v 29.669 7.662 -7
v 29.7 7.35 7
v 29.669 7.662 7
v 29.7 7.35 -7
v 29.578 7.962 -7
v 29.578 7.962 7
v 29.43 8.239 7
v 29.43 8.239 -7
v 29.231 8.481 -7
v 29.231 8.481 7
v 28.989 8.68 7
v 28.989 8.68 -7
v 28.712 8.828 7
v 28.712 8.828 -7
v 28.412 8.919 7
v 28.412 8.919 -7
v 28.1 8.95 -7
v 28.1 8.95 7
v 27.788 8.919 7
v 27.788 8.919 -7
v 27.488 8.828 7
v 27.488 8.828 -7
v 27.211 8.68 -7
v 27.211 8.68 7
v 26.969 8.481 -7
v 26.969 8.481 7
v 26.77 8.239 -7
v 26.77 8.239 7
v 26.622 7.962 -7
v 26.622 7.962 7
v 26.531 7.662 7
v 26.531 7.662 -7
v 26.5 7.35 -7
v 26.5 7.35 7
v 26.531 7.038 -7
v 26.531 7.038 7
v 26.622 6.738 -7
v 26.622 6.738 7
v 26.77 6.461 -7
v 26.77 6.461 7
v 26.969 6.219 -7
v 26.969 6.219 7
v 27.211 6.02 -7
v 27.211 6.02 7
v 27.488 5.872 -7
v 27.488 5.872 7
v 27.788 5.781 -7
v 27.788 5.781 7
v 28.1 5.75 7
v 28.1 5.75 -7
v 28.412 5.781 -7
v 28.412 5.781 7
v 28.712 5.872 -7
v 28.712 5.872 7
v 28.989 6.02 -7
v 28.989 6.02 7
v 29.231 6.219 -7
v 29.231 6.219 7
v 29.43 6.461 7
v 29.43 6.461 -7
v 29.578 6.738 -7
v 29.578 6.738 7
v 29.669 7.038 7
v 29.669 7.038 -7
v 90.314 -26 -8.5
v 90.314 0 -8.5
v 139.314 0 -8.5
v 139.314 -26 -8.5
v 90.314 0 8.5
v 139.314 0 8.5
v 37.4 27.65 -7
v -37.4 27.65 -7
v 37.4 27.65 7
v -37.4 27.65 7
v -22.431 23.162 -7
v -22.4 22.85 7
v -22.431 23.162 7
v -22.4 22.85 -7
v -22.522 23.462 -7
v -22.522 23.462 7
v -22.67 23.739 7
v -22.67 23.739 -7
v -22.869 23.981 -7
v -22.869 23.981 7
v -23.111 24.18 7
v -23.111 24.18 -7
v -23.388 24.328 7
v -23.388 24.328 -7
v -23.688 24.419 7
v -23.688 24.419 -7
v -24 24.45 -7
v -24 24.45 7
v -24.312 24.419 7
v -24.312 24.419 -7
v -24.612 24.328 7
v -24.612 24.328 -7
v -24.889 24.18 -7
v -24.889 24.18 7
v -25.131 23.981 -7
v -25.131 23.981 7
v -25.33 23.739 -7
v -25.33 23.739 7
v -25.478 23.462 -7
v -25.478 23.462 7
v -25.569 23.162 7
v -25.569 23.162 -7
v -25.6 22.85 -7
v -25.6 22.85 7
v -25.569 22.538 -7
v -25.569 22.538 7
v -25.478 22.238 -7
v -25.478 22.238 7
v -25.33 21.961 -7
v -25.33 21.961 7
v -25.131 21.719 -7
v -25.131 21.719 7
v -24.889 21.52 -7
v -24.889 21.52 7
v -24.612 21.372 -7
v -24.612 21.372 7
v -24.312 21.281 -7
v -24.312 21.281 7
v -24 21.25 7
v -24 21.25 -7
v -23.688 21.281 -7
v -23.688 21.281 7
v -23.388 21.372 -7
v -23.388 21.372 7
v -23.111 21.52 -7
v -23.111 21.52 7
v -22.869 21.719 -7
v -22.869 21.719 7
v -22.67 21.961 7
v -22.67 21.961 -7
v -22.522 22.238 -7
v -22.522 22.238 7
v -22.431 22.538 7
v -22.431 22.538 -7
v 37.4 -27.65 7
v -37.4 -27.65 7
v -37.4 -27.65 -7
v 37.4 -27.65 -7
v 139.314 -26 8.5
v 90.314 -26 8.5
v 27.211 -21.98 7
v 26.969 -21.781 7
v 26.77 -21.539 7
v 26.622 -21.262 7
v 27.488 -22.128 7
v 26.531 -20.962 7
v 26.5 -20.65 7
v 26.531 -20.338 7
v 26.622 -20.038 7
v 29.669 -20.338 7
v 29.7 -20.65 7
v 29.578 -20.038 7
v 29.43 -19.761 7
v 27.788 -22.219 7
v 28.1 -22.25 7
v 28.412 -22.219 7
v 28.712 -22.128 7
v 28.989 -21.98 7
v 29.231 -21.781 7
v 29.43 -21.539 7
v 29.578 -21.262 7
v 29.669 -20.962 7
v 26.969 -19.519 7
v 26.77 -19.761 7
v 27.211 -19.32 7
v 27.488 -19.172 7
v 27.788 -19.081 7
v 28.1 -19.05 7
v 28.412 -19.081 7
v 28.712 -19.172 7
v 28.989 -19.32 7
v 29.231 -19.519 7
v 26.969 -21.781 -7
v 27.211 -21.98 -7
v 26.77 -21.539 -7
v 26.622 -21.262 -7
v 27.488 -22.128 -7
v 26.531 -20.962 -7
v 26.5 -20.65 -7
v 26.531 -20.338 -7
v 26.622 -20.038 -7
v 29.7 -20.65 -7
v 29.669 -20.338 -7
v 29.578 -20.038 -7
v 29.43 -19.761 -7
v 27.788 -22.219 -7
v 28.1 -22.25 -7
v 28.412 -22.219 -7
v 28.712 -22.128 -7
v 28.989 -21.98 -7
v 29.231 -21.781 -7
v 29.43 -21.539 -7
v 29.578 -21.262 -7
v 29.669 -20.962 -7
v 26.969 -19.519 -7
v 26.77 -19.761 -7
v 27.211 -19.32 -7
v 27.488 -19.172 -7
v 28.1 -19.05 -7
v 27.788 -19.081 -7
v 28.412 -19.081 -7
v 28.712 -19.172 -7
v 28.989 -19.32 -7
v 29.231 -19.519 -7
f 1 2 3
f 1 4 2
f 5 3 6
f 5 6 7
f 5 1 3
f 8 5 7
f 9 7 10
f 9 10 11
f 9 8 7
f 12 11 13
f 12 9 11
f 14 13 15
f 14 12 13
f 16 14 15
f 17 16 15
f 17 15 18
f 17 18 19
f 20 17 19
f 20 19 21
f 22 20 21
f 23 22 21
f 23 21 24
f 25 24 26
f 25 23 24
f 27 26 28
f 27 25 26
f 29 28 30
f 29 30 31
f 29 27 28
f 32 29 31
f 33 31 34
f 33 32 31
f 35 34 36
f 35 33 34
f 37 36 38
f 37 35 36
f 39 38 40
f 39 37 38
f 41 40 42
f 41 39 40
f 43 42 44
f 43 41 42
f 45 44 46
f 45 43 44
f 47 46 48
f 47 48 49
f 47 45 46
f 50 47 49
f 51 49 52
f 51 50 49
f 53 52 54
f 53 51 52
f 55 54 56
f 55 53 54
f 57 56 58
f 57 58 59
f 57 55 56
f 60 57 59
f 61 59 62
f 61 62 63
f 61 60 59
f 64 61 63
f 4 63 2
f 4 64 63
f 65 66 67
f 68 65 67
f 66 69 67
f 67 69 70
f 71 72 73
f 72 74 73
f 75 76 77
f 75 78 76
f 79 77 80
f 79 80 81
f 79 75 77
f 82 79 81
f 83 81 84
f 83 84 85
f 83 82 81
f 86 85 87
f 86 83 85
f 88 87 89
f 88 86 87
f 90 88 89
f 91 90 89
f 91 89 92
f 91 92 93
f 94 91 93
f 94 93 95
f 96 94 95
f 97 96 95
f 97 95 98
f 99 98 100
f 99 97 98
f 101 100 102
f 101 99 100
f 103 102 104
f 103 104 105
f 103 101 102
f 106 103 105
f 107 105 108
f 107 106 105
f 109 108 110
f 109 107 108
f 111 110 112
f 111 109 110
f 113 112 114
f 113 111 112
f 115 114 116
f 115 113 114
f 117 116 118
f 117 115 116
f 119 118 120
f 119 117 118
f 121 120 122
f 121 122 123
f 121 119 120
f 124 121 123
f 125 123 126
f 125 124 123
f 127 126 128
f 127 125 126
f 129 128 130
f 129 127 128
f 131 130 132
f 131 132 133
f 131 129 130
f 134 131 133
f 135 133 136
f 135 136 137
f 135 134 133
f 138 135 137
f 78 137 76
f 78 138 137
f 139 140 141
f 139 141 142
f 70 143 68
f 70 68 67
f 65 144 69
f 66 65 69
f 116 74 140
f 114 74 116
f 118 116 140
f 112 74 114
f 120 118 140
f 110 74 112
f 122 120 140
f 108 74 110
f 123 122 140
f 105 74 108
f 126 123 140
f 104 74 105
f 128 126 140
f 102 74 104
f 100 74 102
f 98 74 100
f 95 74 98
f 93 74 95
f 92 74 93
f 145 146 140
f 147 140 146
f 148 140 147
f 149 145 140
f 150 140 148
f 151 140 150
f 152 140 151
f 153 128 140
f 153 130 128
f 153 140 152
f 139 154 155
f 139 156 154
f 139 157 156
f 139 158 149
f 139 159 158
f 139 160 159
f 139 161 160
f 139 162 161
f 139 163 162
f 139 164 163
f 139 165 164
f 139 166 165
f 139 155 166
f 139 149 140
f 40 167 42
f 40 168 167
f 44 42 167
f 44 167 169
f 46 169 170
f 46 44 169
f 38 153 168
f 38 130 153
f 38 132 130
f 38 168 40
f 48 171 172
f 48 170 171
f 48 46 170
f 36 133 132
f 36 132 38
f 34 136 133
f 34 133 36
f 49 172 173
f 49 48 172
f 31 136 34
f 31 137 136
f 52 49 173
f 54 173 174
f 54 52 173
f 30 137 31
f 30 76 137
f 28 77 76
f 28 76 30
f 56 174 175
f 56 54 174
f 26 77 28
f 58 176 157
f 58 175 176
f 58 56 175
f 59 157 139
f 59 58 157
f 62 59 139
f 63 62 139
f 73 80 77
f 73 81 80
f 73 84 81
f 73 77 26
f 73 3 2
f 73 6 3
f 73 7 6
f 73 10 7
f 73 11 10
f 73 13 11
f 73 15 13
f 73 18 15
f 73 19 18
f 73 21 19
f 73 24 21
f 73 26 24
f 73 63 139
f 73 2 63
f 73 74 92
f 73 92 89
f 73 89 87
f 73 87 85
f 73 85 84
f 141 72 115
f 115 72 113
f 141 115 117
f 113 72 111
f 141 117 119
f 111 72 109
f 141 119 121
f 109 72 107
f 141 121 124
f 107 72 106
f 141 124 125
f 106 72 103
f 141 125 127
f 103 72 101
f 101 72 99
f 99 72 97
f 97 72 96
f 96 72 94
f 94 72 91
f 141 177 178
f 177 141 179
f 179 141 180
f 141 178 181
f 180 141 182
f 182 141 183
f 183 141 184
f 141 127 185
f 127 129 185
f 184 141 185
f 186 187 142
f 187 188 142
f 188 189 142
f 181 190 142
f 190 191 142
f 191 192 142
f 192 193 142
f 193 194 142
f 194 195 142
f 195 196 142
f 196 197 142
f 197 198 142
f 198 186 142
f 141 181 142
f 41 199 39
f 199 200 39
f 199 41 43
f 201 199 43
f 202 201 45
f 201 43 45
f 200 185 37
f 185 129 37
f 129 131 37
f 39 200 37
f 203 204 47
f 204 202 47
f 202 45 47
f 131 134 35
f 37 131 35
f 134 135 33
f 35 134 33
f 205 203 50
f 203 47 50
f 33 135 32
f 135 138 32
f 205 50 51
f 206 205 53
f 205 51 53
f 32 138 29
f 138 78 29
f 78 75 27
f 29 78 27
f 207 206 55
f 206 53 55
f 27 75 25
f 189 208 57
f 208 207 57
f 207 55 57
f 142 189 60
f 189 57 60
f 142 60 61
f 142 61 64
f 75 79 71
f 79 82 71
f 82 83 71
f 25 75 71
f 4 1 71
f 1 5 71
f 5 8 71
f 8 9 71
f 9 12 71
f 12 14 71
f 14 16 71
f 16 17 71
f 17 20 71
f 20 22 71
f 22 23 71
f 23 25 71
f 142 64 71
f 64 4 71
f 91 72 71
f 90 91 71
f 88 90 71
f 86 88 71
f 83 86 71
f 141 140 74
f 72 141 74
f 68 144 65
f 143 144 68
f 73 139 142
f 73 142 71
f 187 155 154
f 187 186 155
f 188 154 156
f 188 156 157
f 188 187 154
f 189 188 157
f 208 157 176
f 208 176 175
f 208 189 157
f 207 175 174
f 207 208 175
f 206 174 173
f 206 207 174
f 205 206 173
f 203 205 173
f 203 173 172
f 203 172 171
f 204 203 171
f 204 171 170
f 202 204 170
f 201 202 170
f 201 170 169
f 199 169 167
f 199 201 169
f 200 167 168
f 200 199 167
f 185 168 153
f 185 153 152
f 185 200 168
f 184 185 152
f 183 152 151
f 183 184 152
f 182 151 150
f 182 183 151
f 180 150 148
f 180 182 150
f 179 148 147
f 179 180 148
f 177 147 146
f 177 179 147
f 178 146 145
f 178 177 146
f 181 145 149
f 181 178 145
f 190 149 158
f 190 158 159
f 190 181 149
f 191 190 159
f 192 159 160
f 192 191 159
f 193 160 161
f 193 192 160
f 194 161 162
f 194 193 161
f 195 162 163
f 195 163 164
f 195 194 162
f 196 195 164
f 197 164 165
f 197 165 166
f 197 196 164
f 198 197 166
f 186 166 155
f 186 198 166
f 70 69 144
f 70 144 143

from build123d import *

# Parameters (mm, degrees)
F0_W     = 74.8
F0_H     = 55.3
F0_R     = 1.6
F1_DEPTH = 7
F2_W     = 49
F2_H     = 26
F3_DEPTH = 8.5


with BuildPart() as f1:
    # F0 (on Top) → F1 (new body, symmetric)
    with BuildSketch(Plane.XY):
        Rectangle(F0_W, F0_H)
        with Locations((28.1, -20.65)):
            Circle(F0_R, mode=Mode.SUBTRACT)
        with Locations((-24, 22.85)):
            Circle(F0_R, mode=Mode.SUBTRACT)
        with Locations((28.1, 7.35)):
            Circle(F0_R, mode=Mode.SUBTRACT)
    extrude(amount=F1_DEPTH, both=True)


with BuildPart() as f3:
    # F2 (on Top) → F3 (new body, symmetric)
    with BuildSketch(Plane.XY):
        with Locations((114.814284, -13)):
            Rectangle(F2_W, F2_H)
    extrude(amount=F3_DEPTH, both=True)


solid = Compound([f1.part, f3.part])
